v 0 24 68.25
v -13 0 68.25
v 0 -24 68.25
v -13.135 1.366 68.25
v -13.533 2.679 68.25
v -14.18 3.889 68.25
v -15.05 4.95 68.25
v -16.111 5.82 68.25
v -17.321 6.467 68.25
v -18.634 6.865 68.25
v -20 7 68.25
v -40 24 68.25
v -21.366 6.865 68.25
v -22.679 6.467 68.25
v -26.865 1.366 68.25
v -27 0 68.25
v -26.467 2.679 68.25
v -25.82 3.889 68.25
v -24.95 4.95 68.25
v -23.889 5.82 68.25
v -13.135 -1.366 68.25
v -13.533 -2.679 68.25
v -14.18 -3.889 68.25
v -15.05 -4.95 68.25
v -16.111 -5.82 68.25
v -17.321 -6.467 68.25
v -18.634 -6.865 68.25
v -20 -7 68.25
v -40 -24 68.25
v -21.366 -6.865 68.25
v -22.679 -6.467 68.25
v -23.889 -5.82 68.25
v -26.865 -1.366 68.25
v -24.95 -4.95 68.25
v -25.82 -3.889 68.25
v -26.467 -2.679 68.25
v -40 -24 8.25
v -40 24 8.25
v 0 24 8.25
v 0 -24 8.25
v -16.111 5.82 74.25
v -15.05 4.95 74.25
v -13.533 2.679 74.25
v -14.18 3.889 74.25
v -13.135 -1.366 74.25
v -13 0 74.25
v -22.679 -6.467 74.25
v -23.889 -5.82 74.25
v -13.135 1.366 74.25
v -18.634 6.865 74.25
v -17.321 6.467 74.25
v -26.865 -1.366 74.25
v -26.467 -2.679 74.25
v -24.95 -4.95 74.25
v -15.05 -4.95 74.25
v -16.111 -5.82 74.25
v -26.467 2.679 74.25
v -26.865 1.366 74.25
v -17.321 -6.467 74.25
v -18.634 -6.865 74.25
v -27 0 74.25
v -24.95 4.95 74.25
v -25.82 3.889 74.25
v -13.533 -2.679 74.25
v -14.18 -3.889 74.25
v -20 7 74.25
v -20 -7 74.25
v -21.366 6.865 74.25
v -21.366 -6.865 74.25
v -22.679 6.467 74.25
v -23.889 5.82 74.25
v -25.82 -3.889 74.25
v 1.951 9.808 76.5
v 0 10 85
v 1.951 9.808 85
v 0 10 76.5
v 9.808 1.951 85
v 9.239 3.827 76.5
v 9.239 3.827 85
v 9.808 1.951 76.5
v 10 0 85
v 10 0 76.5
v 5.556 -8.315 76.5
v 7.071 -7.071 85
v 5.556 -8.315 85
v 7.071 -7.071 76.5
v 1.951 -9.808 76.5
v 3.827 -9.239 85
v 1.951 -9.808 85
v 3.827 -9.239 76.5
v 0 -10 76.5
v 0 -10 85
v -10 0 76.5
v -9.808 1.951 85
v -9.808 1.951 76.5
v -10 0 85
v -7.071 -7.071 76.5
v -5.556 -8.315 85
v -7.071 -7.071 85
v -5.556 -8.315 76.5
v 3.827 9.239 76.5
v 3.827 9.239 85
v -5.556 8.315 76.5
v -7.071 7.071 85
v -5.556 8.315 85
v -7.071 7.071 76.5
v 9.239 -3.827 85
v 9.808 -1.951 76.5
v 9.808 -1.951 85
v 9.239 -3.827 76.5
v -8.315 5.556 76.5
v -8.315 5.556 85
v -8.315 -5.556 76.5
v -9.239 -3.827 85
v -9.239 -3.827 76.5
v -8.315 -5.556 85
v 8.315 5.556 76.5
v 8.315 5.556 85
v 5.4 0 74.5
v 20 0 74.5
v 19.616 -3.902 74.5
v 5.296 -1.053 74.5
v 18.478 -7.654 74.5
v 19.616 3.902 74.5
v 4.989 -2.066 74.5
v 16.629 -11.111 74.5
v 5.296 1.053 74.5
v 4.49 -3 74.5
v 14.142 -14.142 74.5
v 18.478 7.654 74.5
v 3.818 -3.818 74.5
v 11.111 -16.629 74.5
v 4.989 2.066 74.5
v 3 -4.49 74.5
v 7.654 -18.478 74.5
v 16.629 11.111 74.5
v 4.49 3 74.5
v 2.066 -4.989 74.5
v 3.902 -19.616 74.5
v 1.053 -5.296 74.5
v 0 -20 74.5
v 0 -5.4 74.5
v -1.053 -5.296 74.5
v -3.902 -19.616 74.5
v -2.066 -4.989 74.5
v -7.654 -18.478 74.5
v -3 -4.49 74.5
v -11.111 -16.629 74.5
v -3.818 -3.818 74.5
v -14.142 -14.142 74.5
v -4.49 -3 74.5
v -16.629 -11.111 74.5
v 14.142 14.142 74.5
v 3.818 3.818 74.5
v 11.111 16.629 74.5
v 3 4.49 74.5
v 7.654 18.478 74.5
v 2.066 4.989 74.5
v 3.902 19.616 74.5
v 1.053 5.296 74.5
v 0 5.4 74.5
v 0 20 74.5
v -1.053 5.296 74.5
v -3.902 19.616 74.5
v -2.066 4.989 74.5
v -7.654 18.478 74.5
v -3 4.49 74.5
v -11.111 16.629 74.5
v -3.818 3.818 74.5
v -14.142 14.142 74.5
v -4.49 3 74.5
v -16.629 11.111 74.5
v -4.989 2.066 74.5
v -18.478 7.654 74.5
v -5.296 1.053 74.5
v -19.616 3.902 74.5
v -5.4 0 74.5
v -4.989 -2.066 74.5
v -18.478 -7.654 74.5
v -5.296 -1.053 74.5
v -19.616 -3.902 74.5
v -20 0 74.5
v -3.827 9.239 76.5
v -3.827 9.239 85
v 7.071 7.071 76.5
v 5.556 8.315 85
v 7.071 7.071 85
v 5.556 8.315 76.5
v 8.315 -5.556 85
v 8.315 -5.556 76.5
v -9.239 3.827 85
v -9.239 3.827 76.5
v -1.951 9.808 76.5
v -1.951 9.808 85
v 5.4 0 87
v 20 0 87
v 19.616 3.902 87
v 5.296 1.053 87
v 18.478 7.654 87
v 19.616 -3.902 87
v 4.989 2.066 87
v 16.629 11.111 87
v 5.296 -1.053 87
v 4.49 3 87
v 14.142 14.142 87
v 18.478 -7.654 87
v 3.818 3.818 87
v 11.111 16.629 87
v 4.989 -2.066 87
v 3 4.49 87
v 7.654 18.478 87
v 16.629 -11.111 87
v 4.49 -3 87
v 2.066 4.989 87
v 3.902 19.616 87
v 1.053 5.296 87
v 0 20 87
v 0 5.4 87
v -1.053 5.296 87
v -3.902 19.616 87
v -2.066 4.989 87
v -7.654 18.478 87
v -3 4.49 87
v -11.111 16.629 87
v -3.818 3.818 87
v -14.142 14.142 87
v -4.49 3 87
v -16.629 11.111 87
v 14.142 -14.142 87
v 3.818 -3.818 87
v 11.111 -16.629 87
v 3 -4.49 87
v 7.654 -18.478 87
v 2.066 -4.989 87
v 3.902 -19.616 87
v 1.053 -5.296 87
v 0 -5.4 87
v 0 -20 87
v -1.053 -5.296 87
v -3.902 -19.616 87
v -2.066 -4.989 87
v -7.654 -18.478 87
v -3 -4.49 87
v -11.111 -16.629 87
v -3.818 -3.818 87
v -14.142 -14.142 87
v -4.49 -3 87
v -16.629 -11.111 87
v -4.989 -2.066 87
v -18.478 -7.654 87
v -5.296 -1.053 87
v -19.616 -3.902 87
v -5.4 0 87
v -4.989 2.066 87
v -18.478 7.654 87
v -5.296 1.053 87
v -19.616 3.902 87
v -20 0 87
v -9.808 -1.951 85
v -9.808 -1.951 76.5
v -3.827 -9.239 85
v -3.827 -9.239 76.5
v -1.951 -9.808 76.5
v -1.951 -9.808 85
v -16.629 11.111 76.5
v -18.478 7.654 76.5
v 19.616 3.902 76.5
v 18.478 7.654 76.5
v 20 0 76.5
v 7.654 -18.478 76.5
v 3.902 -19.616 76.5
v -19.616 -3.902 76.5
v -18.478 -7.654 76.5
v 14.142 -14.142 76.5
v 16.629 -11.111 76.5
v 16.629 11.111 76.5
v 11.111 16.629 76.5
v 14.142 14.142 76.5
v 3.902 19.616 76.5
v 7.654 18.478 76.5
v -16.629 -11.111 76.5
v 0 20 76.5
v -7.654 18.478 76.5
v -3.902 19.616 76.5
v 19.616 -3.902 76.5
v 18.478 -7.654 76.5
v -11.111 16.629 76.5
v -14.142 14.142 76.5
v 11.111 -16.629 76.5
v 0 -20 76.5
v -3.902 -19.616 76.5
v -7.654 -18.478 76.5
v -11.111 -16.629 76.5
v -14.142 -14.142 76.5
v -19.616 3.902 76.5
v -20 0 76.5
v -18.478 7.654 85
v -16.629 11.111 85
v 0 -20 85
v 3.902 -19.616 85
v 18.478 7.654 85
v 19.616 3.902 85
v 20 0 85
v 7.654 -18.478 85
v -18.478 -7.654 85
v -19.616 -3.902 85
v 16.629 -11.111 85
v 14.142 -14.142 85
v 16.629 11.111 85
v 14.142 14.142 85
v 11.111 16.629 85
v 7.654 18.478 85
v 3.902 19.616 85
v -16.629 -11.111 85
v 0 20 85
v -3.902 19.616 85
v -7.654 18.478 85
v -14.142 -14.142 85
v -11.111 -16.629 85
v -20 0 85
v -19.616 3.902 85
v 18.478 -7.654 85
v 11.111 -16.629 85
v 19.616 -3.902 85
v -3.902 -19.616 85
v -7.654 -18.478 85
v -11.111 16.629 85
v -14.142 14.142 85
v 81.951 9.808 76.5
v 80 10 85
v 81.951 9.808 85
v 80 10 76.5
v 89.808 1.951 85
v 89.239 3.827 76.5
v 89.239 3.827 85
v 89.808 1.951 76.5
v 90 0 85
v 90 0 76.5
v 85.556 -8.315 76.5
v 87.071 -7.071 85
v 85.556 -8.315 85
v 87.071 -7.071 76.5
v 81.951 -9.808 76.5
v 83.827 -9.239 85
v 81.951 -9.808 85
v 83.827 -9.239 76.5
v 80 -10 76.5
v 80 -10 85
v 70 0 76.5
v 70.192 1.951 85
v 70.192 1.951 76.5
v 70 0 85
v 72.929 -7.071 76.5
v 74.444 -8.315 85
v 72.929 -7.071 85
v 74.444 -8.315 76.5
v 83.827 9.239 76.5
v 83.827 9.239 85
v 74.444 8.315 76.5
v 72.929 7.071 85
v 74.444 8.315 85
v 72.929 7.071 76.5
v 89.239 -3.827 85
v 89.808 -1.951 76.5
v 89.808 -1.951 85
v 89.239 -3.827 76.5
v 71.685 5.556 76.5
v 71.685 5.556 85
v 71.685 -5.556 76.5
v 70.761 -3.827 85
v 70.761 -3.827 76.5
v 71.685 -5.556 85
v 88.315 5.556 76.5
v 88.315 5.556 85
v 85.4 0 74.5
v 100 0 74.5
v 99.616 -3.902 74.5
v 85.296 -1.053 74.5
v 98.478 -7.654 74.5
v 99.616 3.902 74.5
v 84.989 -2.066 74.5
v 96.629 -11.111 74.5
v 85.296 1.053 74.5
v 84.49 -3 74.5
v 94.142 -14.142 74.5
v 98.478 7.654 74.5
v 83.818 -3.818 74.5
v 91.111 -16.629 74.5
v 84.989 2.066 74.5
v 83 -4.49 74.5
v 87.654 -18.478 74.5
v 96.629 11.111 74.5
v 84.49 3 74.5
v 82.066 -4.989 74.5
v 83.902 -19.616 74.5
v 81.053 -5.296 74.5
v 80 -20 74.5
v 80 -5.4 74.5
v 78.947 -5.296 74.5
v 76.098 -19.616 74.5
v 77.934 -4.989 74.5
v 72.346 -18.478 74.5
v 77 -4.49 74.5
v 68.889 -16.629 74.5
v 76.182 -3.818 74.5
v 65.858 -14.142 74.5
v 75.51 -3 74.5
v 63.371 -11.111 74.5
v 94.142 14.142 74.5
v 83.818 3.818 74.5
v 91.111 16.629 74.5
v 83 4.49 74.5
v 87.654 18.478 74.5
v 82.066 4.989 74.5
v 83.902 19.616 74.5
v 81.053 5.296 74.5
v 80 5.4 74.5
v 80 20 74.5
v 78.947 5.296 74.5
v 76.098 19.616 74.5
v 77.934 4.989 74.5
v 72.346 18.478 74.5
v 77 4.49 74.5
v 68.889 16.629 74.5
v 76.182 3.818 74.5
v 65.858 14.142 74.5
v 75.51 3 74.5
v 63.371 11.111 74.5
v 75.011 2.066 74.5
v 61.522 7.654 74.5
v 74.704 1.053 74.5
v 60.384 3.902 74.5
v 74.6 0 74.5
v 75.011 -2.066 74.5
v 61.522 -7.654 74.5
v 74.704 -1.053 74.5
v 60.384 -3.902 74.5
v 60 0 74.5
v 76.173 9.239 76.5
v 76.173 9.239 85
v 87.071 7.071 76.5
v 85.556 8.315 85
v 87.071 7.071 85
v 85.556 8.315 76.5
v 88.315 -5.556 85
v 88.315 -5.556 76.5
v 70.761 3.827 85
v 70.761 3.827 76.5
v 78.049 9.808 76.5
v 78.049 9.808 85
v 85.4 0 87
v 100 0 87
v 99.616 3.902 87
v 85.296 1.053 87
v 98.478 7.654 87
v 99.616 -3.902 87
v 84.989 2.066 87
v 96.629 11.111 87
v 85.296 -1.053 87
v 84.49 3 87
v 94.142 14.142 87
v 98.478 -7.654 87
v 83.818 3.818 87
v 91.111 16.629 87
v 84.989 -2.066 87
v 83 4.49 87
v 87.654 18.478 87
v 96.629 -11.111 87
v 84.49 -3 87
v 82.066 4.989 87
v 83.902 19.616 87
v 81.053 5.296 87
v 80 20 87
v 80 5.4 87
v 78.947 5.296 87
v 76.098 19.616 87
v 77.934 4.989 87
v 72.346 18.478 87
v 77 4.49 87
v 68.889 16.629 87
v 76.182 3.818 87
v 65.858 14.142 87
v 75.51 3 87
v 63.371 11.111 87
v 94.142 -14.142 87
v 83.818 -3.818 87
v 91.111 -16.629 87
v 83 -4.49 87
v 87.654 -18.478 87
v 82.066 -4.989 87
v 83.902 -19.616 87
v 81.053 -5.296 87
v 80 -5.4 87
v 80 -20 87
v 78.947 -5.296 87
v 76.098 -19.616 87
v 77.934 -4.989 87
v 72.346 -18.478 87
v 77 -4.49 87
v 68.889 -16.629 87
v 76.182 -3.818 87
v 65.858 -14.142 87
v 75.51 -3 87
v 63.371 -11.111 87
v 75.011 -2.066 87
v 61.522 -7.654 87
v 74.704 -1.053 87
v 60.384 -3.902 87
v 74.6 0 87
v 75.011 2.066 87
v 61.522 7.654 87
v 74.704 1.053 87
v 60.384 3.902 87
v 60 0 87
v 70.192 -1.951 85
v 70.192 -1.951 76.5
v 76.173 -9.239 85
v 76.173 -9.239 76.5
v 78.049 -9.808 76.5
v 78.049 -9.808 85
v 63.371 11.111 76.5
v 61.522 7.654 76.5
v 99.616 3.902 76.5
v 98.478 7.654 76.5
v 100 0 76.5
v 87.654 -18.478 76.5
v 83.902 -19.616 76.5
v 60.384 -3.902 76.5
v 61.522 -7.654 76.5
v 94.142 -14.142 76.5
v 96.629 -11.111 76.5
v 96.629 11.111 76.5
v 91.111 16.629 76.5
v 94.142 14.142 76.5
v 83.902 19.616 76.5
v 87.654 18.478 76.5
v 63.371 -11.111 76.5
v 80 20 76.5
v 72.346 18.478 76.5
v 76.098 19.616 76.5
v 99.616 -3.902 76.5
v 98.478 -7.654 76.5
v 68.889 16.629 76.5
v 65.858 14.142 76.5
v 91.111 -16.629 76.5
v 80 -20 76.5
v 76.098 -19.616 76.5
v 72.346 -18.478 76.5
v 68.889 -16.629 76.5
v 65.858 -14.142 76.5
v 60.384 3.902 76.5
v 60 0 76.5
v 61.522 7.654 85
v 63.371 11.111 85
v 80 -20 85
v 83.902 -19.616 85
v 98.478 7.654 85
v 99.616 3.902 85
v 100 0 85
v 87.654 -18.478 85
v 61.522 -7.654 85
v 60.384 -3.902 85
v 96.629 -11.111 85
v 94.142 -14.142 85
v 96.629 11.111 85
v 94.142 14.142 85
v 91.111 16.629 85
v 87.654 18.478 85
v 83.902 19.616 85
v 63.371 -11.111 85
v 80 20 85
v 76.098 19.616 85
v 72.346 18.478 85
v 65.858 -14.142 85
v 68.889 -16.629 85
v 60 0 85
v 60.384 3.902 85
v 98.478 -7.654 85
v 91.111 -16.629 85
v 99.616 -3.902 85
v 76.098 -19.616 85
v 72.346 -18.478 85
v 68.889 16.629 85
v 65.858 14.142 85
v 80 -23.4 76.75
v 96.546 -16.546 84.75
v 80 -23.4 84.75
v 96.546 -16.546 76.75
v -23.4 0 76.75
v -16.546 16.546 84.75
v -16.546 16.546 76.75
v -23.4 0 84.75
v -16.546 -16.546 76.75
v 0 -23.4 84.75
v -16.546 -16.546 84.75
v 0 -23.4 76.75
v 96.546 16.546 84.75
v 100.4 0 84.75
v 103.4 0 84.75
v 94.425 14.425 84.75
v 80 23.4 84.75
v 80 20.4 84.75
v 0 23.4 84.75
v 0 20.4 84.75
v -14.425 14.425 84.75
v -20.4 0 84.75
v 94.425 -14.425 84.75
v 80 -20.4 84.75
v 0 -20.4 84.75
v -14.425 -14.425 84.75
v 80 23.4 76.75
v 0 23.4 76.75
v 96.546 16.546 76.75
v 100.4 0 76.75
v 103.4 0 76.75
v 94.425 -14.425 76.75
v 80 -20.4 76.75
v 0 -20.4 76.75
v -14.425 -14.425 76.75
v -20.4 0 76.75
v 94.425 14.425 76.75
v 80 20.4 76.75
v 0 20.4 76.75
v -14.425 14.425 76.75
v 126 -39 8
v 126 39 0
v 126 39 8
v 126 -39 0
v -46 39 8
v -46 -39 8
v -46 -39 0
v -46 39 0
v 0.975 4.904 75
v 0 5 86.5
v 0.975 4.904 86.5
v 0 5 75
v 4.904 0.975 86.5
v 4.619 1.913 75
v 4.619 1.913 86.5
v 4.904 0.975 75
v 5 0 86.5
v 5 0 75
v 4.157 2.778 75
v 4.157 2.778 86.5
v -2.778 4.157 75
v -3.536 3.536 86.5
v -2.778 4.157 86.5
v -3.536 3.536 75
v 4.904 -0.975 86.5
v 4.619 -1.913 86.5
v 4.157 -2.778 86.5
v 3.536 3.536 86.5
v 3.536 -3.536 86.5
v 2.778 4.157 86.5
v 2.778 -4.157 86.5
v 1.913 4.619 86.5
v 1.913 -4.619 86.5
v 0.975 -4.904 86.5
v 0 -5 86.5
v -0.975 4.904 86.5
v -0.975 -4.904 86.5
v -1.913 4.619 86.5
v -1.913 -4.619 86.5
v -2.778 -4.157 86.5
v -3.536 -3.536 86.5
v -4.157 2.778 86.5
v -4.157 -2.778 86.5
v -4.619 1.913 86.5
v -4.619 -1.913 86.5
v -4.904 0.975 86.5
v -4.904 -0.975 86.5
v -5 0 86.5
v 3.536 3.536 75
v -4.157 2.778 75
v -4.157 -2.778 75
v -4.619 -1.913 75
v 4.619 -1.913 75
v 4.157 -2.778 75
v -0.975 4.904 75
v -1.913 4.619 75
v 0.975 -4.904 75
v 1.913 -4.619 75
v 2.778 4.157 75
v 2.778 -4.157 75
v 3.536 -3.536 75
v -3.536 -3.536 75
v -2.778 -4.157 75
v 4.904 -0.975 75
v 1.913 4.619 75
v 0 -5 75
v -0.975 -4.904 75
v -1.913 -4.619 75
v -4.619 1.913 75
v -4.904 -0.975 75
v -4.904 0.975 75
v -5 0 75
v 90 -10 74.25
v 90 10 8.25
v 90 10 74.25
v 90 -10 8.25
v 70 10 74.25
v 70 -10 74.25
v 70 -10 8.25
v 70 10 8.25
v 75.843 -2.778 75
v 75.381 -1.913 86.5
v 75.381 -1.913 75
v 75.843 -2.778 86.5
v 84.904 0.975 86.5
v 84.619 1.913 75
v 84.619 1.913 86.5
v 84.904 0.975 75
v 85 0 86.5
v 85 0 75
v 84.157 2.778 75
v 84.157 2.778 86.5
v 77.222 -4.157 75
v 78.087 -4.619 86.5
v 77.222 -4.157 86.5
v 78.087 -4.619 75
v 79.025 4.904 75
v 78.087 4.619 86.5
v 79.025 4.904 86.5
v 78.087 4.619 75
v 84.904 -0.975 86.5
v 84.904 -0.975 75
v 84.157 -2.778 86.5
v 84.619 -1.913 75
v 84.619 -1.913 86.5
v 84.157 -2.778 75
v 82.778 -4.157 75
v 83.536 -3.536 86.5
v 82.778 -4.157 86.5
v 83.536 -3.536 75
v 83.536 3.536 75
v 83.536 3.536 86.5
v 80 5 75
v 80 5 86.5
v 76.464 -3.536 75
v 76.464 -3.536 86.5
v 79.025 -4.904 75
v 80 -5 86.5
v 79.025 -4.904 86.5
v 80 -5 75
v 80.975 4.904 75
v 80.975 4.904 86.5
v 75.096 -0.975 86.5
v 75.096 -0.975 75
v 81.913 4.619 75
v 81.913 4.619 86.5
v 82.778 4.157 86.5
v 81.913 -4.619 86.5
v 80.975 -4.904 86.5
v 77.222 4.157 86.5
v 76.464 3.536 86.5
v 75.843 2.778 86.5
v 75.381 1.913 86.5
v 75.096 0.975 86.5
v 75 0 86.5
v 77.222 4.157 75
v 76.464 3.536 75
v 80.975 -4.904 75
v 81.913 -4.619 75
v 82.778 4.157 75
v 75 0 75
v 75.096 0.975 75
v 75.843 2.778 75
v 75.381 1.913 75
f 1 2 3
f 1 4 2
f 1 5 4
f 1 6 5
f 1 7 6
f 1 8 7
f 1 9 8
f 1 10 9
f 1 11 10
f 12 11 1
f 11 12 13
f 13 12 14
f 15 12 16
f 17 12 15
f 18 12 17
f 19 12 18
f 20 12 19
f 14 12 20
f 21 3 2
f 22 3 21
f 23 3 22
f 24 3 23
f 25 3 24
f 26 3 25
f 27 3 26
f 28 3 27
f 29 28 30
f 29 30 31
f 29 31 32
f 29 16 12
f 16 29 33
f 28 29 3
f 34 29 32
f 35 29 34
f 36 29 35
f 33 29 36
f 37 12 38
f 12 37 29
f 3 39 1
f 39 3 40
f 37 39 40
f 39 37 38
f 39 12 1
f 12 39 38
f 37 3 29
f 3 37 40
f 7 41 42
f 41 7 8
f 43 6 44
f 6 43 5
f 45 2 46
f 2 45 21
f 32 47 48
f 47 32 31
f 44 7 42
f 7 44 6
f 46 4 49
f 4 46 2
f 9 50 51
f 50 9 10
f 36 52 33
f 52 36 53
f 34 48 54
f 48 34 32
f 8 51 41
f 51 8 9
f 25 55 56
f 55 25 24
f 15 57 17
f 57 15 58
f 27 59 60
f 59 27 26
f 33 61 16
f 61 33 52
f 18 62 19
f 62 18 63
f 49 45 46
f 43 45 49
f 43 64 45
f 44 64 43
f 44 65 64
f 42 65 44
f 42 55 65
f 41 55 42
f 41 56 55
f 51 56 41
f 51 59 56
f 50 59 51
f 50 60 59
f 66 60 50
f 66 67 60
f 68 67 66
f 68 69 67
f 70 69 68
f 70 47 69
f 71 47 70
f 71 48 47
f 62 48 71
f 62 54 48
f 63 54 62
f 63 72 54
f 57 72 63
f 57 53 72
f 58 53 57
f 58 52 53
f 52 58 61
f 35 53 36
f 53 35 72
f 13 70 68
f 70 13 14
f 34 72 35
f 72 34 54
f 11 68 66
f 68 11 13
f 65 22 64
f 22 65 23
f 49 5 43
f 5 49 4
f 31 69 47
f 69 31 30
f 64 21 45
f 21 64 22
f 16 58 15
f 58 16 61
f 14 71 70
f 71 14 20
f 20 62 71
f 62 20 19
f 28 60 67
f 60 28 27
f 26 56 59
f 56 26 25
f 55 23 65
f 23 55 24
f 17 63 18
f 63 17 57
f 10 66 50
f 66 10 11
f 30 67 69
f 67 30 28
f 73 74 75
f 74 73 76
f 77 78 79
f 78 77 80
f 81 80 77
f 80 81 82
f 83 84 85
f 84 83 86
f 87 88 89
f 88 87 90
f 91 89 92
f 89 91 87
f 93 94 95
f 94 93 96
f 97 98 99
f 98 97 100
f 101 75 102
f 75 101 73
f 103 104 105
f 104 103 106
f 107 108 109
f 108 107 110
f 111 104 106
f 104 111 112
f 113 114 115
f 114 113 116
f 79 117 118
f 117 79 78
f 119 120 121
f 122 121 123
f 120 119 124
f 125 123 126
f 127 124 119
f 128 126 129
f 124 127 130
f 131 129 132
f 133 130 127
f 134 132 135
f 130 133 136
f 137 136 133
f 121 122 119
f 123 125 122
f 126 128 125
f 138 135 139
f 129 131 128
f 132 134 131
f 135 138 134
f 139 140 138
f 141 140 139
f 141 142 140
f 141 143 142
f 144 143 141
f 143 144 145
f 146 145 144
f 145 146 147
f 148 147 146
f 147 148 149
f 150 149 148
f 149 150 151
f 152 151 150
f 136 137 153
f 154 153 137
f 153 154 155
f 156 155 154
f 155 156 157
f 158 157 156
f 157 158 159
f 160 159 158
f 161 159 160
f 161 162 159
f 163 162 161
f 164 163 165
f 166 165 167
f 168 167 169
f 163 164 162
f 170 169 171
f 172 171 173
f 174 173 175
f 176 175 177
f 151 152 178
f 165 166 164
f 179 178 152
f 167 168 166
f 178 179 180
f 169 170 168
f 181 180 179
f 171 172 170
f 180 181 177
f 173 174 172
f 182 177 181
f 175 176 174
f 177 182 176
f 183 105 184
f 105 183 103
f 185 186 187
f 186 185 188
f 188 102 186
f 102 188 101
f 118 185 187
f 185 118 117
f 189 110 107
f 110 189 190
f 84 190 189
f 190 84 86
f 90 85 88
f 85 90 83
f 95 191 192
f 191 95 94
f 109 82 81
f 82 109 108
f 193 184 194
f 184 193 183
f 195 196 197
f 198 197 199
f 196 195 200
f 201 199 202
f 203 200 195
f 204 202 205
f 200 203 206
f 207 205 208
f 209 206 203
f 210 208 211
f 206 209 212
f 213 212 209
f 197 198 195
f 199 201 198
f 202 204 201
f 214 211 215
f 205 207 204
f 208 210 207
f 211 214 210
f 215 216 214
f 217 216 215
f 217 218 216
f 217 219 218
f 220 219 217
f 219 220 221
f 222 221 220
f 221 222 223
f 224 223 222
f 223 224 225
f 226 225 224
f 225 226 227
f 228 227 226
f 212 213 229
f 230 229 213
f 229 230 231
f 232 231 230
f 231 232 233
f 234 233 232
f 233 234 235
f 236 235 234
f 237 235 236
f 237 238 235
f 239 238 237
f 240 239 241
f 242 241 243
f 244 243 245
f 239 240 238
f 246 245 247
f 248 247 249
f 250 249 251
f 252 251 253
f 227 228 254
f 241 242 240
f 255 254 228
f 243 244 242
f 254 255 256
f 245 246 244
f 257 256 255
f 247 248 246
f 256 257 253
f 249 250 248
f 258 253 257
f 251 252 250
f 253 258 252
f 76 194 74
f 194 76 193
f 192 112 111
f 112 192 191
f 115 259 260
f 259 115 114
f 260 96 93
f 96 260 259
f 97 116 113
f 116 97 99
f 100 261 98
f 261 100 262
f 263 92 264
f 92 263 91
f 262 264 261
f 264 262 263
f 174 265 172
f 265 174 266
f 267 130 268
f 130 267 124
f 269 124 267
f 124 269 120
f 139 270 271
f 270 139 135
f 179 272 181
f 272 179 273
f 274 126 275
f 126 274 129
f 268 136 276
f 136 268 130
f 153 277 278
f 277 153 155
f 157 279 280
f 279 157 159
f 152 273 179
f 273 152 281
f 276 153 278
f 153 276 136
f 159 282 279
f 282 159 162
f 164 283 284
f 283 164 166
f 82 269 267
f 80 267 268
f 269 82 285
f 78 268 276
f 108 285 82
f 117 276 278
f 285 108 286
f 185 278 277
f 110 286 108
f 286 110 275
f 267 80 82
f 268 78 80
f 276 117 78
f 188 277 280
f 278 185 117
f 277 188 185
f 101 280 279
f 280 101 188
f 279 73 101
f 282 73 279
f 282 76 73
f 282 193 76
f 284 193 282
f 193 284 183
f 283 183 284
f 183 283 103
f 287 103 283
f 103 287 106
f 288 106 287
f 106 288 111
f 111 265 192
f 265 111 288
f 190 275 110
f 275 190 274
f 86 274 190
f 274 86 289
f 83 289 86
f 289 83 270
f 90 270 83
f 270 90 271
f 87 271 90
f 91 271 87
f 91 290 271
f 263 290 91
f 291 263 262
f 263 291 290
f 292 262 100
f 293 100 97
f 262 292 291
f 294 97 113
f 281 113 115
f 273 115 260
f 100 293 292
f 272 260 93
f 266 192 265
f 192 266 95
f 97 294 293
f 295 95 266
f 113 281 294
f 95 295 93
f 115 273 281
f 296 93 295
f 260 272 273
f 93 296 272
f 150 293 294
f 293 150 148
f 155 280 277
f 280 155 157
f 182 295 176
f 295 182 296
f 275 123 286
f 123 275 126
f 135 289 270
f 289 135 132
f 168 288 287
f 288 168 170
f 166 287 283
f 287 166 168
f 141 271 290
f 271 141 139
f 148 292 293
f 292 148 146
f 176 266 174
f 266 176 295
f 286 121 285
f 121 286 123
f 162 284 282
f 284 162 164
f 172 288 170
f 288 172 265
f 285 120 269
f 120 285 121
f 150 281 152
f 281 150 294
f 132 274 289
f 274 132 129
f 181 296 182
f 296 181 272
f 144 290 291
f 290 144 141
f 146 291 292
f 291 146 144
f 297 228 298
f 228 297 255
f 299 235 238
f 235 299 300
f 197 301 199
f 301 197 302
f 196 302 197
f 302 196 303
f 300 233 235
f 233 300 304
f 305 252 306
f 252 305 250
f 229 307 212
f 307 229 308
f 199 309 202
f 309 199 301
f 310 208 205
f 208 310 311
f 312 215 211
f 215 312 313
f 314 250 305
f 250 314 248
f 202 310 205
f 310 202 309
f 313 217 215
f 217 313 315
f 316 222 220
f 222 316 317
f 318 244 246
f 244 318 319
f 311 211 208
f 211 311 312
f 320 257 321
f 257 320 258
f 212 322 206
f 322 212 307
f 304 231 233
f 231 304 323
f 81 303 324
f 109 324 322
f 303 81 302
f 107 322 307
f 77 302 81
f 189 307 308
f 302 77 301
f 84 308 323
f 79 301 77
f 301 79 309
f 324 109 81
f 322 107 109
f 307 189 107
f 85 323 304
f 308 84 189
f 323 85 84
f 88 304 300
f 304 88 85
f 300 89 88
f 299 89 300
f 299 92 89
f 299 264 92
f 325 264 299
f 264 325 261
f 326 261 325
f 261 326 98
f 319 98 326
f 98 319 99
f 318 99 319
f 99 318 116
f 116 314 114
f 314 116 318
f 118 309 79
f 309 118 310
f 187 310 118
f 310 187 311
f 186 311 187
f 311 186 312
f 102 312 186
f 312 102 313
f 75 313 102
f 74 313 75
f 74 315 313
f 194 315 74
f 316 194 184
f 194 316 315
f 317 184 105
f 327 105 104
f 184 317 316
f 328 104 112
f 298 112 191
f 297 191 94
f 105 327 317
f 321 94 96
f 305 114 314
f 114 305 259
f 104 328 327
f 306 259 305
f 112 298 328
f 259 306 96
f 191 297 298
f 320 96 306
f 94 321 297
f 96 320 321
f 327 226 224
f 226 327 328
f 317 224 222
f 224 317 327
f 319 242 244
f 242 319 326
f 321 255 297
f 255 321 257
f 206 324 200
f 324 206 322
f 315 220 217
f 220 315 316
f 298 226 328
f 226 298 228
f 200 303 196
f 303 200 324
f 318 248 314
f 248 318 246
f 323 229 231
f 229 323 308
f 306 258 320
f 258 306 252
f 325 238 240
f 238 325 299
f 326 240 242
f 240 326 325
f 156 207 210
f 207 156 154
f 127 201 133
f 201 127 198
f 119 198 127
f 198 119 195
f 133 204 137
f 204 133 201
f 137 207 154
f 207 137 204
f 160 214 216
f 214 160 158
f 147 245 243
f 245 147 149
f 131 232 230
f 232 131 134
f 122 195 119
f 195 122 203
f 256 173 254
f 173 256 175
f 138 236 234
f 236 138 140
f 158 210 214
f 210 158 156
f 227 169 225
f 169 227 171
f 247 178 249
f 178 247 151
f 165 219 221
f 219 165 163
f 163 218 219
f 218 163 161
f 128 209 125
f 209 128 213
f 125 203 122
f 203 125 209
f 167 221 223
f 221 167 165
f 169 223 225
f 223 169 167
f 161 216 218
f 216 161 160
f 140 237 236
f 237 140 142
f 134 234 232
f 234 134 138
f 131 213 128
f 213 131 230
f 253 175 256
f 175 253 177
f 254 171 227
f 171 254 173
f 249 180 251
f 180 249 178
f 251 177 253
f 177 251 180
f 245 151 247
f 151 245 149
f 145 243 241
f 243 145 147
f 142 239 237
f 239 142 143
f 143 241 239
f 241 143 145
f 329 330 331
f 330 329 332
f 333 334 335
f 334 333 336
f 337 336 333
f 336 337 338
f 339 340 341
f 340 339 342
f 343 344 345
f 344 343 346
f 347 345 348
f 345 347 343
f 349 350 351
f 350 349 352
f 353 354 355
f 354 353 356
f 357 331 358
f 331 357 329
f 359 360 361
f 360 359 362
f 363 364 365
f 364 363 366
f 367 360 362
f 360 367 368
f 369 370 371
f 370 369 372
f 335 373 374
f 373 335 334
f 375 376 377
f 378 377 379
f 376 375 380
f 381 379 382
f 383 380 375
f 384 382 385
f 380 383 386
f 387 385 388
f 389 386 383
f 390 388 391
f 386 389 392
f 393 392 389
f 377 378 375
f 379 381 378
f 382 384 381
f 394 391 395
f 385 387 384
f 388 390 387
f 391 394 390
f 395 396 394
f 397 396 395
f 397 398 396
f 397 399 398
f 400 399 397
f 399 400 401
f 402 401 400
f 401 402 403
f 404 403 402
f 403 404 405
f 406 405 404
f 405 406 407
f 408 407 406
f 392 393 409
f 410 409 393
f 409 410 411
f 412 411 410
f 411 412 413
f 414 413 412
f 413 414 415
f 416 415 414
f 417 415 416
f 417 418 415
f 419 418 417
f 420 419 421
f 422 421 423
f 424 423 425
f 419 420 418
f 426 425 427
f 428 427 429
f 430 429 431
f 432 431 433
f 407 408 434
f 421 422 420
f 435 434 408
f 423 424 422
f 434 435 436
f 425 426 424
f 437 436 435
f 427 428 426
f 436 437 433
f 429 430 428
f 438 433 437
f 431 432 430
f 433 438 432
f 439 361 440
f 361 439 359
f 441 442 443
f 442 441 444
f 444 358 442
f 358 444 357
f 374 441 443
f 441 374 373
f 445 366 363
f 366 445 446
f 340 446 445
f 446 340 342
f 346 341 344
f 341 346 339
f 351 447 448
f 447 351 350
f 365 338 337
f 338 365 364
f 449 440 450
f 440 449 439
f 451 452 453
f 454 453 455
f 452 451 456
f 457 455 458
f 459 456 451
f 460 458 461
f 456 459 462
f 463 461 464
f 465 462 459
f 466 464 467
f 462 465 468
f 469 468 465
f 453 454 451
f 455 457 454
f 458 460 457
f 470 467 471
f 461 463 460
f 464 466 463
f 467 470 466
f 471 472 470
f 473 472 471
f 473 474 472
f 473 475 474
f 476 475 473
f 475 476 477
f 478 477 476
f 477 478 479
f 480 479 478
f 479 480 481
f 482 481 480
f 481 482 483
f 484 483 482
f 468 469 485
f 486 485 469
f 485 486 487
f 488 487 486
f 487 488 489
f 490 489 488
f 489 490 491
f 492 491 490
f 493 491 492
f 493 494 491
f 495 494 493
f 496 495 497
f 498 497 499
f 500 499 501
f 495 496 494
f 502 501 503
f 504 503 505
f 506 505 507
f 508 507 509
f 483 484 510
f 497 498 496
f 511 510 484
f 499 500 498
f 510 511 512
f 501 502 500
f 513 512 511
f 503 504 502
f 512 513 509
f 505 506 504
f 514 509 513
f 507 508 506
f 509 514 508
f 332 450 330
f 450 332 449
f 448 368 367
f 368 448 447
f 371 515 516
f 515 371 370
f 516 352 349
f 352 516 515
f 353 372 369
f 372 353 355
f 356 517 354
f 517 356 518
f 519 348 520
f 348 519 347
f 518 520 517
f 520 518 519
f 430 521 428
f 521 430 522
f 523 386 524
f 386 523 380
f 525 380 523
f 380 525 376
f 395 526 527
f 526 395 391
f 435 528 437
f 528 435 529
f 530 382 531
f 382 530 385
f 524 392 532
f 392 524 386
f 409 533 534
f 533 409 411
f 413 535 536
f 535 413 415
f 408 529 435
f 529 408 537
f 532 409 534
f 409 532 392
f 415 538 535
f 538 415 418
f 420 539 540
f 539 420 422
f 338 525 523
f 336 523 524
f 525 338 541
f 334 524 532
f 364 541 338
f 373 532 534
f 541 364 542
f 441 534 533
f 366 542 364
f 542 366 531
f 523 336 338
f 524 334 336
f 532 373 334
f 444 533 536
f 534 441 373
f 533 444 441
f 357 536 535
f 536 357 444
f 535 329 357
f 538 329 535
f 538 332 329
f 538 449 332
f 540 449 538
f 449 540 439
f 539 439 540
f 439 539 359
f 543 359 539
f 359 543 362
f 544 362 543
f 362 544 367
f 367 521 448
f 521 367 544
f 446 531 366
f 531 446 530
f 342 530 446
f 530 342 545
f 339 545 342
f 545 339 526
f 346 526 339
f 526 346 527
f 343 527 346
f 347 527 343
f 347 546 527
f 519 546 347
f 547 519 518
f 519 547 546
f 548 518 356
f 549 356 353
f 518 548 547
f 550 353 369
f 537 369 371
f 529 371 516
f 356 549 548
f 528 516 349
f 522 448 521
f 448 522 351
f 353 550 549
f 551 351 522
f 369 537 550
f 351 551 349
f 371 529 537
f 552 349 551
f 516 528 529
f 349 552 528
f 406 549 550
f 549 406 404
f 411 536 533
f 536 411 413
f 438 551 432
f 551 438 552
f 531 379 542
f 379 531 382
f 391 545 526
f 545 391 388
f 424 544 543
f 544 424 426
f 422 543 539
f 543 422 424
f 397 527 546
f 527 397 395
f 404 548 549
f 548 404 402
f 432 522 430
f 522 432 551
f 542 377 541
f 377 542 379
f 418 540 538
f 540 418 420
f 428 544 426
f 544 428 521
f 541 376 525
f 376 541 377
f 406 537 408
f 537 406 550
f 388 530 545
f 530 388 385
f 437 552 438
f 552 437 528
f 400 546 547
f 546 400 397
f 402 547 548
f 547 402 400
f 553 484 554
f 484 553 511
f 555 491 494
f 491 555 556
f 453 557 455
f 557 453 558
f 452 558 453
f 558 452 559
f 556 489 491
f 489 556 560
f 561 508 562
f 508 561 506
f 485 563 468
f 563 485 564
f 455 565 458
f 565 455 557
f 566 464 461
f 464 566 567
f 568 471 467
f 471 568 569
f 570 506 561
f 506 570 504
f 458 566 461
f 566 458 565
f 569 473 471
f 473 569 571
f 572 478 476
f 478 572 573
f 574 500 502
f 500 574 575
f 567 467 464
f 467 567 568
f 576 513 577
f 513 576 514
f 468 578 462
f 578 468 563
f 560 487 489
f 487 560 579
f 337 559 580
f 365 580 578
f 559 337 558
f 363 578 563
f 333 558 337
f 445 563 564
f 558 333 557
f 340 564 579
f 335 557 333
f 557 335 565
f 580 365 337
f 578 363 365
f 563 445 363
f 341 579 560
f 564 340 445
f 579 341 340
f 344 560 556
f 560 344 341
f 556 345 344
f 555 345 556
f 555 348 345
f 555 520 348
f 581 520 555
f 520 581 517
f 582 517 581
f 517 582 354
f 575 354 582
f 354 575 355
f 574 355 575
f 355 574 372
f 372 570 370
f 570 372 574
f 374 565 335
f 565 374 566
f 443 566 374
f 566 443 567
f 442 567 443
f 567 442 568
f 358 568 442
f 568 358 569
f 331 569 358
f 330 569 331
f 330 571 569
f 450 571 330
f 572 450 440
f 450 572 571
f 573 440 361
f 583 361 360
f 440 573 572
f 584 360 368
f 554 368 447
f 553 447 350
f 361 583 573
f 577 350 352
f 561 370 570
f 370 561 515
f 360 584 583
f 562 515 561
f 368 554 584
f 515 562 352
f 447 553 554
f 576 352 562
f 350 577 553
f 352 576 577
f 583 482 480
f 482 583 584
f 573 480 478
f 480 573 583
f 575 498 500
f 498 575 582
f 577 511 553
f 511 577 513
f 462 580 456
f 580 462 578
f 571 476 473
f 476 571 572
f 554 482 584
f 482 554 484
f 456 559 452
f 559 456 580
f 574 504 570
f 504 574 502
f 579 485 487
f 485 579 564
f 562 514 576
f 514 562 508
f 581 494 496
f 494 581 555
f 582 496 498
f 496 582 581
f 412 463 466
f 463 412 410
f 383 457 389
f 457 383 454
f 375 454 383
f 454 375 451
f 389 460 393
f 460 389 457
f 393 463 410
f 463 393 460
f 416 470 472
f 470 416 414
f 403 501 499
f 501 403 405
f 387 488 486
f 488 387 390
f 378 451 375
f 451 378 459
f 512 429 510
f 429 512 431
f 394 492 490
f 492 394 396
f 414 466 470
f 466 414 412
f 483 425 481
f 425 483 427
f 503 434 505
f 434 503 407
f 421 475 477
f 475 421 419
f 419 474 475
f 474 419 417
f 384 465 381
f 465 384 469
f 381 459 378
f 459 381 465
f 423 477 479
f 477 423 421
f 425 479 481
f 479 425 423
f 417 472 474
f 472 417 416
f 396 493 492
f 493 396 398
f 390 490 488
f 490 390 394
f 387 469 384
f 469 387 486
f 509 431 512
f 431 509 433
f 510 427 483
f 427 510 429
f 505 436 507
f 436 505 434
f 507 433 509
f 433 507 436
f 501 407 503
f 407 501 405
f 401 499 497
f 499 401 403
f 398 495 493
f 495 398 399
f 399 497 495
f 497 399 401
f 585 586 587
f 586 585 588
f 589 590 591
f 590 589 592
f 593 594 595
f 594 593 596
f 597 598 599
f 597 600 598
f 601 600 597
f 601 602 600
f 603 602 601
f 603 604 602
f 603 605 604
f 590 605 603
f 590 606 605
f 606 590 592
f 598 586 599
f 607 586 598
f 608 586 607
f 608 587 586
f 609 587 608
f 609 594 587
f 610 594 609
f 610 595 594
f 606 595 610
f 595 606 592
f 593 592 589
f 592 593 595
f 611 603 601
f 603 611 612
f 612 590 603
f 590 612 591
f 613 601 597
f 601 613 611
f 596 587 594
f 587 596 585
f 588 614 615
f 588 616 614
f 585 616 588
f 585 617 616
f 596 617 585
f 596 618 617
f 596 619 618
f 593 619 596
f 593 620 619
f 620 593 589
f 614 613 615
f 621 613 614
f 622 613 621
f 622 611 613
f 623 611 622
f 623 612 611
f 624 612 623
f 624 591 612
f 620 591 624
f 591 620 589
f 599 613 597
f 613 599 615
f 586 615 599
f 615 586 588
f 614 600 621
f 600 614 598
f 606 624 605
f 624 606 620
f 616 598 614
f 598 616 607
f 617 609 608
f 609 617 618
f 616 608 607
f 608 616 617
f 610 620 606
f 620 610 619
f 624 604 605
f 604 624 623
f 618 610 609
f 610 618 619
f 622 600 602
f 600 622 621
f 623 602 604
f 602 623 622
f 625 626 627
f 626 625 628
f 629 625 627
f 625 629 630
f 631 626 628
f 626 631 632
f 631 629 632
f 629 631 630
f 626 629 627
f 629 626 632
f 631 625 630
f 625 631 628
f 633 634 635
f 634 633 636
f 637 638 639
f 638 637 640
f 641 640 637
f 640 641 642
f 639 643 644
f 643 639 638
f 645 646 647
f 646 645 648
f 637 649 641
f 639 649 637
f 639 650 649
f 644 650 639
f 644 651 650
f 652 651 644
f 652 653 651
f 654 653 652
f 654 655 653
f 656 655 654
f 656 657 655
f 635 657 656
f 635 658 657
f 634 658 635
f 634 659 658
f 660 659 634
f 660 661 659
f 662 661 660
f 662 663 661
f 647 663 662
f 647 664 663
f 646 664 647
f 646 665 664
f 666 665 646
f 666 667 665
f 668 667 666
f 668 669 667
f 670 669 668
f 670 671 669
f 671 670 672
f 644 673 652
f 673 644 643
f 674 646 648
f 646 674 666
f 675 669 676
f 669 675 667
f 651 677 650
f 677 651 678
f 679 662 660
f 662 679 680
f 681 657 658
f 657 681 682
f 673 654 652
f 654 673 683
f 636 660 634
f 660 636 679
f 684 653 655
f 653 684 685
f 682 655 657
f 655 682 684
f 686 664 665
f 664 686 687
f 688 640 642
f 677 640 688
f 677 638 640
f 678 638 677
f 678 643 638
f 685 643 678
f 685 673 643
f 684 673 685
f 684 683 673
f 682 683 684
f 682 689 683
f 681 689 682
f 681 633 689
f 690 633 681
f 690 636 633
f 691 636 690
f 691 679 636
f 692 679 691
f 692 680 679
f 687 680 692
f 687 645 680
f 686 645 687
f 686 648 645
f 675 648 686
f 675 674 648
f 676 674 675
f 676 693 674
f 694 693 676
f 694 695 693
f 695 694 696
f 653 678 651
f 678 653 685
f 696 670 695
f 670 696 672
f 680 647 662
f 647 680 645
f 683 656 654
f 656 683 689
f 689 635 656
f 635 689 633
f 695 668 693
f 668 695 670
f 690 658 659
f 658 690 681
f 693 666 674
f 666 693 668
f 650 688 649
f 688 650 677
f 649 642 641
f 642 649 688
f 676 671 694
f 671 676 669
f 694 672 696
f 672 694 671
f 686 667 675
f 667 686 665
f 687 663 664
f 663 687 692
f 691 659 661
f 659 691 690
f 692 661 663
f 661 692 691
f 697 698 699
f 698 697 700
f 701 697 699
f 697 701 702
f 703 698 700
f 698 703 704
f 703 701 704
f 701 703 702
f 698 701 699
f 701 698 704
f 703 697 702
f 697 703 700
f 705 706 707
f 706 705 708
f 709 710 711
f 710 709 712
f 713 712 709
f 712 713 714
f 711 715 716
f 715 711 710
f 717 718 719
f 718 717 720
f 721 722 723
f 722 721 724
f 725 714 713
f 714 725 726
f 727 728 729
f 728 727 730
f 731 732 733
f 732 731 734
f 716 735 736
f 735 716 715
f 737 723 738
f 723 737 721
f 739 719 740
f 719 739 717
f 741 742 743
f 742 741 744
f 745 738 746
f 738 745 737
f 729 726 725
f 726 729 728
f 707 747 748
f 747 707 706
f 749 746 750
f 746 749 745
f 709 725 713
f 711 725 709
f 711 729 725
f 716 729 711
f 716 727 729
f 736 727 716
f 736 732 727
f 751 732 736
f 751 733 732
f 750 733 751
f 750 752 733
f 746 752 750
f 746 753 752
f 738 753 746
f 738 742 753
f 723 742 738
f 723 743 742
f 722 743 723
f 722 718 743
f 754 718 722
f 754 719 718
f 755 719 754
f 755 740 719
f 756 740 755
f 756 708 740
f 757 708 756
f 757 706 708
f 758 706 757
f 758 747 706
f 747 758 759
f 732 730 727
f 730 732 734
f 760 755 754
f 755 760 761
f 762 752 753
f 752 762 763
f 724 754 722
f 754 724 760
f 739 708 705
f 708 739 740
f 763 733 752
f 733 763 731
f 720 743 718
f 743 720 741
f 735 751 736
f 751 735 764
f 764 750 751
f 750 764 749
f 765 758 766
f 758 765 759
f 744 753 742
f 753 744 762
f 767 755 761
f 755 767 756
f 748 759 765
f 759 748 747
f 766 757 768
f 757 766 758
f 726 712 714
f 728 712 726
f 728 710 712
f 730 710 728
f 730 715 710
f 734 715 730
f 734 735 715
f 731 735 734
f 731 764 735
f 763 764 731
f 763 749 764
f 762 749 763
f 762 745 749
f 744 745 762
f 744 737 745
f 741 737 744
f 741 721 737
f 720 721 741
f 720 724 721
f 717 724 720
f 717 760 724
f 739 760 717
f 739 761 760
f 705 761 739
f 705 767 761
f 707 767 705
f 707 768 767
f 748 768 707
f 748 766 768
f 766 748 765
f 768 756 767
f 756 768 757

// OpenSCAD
$fn = 32;

// ------------------------------------------------------------------------
// Motor belt drive: span 80 mm, pulleys d40, belt 8 mm wide
// Every part is its own module, assembly() places every instance.
// ------------------------------------------------------------------------

// --- part 1 ---
module base_plate() {
  difference() {
    translate([-86, -39, 0]) cube([172, 78, 8]);
  }
}

// --- part 2 ---
module motor() {
  union() {
    translate([-30, -24, 0]) cube([60, 48, 40]);
    translate([33, 0, 20]) rotate([0, 90, 0]) cylinder(h = 6, d = 14, center = true);
  }
}

// --- part 3 ---
module drive_shaft() {
  translate([0, 0, -5.75]) cylinder(h = 11.5, d = 10);
}

// --- part 4 ---
module pulley_drive() {
  difference() {
    union() {
      cylinder(h = 12.5, d = 20);
      cylinder(h = 2, d = 40);
      translate([0, 0, 10.5]) cylinder(h = 2, d = 40);
    }
    translate([0, 0, -1]) cylinder(h = 14.5, d = 10.8);
  }
}

// --- part 5 ---
module idler_post() {
  translate([-10, -10, 0]) cube([20, 20, 66]);
}

// --- part 6 ---
module driven_shaft() {
  translate([0, 0, -5.75]) cylinder(h = 11.5, d = 10);
}

// --- part 7 ---
module pulley_driven() {
  difference() {
    union() {
      cylinder(h = 12.5, d = 20);
      cylinder(h = 2, d = 40);
      translate([0, 0, 10.5]) cylinder(h = 2, d = 40);
    }
    translate([0, 0, -1]) cylinder(h = 14.5, d = 10.8);
  }
}

// --- part 8 ---
module drive_belt() {
  difference() {
    linear_extrude(height = 8) polygon(points = concat([for (a = [90 : 45 : 270]) [23.4 * cos(a), 23.4 * sin(a)]], [for (a = [270 : 45 : 450]) [80 + 23.4 * cos(a), 23.4 * sin(a)]]));
    translate([0, 0, -1]) linear_extrude(height = 10) polygon(points = concat([for (a = [90 : 45 : 270]) [20.4 * cos(a), 20.4 * sin(a)]], [for (a = [270 : 45 : 450]) [80 + 20.4 * cos(a), 20.4 * sin(a)]]));
  }
}

// --- assembly ---
module assembly() {
  color([0.80, 0.24, 0.20]) translate([40, 0, 0]) rotate([0, 0, 0]) base_plate();
  color([0.20, 0.45, 0.75]) translate([0, 0, 38.25]) rotate([0, 270, 0]) motor();
  color([0.25, 0.62, 0.32]) translate([0, 0, 80.75]) rotate([0, 0, 0]) drive_shaft();
  color([0.92, 0.70, 0.18]) translate([0, 0, 74.5]) rotate([0, 0, 0]) pulley_drive();
  color([0.58, 0.35, 0.70]) translate([80, 0, 8.25]) rotate([0, 0, 0]) idler_post();
  color([0.16, 0.66, 0.66]) translate([80, 0, 80.75]) rotate([0, 0, 0]) driven_shaft();
  color([0.85, 0.48, 0.18]) translate([80, 0, 74.5]) rotate([0, 0, 0]) pulley_driven();
  color([0.55, 0.60, 0.65]) translate([0, 0, 76.75]) rotate([0, 0, 0]) drive_belt();
}

assembly();
